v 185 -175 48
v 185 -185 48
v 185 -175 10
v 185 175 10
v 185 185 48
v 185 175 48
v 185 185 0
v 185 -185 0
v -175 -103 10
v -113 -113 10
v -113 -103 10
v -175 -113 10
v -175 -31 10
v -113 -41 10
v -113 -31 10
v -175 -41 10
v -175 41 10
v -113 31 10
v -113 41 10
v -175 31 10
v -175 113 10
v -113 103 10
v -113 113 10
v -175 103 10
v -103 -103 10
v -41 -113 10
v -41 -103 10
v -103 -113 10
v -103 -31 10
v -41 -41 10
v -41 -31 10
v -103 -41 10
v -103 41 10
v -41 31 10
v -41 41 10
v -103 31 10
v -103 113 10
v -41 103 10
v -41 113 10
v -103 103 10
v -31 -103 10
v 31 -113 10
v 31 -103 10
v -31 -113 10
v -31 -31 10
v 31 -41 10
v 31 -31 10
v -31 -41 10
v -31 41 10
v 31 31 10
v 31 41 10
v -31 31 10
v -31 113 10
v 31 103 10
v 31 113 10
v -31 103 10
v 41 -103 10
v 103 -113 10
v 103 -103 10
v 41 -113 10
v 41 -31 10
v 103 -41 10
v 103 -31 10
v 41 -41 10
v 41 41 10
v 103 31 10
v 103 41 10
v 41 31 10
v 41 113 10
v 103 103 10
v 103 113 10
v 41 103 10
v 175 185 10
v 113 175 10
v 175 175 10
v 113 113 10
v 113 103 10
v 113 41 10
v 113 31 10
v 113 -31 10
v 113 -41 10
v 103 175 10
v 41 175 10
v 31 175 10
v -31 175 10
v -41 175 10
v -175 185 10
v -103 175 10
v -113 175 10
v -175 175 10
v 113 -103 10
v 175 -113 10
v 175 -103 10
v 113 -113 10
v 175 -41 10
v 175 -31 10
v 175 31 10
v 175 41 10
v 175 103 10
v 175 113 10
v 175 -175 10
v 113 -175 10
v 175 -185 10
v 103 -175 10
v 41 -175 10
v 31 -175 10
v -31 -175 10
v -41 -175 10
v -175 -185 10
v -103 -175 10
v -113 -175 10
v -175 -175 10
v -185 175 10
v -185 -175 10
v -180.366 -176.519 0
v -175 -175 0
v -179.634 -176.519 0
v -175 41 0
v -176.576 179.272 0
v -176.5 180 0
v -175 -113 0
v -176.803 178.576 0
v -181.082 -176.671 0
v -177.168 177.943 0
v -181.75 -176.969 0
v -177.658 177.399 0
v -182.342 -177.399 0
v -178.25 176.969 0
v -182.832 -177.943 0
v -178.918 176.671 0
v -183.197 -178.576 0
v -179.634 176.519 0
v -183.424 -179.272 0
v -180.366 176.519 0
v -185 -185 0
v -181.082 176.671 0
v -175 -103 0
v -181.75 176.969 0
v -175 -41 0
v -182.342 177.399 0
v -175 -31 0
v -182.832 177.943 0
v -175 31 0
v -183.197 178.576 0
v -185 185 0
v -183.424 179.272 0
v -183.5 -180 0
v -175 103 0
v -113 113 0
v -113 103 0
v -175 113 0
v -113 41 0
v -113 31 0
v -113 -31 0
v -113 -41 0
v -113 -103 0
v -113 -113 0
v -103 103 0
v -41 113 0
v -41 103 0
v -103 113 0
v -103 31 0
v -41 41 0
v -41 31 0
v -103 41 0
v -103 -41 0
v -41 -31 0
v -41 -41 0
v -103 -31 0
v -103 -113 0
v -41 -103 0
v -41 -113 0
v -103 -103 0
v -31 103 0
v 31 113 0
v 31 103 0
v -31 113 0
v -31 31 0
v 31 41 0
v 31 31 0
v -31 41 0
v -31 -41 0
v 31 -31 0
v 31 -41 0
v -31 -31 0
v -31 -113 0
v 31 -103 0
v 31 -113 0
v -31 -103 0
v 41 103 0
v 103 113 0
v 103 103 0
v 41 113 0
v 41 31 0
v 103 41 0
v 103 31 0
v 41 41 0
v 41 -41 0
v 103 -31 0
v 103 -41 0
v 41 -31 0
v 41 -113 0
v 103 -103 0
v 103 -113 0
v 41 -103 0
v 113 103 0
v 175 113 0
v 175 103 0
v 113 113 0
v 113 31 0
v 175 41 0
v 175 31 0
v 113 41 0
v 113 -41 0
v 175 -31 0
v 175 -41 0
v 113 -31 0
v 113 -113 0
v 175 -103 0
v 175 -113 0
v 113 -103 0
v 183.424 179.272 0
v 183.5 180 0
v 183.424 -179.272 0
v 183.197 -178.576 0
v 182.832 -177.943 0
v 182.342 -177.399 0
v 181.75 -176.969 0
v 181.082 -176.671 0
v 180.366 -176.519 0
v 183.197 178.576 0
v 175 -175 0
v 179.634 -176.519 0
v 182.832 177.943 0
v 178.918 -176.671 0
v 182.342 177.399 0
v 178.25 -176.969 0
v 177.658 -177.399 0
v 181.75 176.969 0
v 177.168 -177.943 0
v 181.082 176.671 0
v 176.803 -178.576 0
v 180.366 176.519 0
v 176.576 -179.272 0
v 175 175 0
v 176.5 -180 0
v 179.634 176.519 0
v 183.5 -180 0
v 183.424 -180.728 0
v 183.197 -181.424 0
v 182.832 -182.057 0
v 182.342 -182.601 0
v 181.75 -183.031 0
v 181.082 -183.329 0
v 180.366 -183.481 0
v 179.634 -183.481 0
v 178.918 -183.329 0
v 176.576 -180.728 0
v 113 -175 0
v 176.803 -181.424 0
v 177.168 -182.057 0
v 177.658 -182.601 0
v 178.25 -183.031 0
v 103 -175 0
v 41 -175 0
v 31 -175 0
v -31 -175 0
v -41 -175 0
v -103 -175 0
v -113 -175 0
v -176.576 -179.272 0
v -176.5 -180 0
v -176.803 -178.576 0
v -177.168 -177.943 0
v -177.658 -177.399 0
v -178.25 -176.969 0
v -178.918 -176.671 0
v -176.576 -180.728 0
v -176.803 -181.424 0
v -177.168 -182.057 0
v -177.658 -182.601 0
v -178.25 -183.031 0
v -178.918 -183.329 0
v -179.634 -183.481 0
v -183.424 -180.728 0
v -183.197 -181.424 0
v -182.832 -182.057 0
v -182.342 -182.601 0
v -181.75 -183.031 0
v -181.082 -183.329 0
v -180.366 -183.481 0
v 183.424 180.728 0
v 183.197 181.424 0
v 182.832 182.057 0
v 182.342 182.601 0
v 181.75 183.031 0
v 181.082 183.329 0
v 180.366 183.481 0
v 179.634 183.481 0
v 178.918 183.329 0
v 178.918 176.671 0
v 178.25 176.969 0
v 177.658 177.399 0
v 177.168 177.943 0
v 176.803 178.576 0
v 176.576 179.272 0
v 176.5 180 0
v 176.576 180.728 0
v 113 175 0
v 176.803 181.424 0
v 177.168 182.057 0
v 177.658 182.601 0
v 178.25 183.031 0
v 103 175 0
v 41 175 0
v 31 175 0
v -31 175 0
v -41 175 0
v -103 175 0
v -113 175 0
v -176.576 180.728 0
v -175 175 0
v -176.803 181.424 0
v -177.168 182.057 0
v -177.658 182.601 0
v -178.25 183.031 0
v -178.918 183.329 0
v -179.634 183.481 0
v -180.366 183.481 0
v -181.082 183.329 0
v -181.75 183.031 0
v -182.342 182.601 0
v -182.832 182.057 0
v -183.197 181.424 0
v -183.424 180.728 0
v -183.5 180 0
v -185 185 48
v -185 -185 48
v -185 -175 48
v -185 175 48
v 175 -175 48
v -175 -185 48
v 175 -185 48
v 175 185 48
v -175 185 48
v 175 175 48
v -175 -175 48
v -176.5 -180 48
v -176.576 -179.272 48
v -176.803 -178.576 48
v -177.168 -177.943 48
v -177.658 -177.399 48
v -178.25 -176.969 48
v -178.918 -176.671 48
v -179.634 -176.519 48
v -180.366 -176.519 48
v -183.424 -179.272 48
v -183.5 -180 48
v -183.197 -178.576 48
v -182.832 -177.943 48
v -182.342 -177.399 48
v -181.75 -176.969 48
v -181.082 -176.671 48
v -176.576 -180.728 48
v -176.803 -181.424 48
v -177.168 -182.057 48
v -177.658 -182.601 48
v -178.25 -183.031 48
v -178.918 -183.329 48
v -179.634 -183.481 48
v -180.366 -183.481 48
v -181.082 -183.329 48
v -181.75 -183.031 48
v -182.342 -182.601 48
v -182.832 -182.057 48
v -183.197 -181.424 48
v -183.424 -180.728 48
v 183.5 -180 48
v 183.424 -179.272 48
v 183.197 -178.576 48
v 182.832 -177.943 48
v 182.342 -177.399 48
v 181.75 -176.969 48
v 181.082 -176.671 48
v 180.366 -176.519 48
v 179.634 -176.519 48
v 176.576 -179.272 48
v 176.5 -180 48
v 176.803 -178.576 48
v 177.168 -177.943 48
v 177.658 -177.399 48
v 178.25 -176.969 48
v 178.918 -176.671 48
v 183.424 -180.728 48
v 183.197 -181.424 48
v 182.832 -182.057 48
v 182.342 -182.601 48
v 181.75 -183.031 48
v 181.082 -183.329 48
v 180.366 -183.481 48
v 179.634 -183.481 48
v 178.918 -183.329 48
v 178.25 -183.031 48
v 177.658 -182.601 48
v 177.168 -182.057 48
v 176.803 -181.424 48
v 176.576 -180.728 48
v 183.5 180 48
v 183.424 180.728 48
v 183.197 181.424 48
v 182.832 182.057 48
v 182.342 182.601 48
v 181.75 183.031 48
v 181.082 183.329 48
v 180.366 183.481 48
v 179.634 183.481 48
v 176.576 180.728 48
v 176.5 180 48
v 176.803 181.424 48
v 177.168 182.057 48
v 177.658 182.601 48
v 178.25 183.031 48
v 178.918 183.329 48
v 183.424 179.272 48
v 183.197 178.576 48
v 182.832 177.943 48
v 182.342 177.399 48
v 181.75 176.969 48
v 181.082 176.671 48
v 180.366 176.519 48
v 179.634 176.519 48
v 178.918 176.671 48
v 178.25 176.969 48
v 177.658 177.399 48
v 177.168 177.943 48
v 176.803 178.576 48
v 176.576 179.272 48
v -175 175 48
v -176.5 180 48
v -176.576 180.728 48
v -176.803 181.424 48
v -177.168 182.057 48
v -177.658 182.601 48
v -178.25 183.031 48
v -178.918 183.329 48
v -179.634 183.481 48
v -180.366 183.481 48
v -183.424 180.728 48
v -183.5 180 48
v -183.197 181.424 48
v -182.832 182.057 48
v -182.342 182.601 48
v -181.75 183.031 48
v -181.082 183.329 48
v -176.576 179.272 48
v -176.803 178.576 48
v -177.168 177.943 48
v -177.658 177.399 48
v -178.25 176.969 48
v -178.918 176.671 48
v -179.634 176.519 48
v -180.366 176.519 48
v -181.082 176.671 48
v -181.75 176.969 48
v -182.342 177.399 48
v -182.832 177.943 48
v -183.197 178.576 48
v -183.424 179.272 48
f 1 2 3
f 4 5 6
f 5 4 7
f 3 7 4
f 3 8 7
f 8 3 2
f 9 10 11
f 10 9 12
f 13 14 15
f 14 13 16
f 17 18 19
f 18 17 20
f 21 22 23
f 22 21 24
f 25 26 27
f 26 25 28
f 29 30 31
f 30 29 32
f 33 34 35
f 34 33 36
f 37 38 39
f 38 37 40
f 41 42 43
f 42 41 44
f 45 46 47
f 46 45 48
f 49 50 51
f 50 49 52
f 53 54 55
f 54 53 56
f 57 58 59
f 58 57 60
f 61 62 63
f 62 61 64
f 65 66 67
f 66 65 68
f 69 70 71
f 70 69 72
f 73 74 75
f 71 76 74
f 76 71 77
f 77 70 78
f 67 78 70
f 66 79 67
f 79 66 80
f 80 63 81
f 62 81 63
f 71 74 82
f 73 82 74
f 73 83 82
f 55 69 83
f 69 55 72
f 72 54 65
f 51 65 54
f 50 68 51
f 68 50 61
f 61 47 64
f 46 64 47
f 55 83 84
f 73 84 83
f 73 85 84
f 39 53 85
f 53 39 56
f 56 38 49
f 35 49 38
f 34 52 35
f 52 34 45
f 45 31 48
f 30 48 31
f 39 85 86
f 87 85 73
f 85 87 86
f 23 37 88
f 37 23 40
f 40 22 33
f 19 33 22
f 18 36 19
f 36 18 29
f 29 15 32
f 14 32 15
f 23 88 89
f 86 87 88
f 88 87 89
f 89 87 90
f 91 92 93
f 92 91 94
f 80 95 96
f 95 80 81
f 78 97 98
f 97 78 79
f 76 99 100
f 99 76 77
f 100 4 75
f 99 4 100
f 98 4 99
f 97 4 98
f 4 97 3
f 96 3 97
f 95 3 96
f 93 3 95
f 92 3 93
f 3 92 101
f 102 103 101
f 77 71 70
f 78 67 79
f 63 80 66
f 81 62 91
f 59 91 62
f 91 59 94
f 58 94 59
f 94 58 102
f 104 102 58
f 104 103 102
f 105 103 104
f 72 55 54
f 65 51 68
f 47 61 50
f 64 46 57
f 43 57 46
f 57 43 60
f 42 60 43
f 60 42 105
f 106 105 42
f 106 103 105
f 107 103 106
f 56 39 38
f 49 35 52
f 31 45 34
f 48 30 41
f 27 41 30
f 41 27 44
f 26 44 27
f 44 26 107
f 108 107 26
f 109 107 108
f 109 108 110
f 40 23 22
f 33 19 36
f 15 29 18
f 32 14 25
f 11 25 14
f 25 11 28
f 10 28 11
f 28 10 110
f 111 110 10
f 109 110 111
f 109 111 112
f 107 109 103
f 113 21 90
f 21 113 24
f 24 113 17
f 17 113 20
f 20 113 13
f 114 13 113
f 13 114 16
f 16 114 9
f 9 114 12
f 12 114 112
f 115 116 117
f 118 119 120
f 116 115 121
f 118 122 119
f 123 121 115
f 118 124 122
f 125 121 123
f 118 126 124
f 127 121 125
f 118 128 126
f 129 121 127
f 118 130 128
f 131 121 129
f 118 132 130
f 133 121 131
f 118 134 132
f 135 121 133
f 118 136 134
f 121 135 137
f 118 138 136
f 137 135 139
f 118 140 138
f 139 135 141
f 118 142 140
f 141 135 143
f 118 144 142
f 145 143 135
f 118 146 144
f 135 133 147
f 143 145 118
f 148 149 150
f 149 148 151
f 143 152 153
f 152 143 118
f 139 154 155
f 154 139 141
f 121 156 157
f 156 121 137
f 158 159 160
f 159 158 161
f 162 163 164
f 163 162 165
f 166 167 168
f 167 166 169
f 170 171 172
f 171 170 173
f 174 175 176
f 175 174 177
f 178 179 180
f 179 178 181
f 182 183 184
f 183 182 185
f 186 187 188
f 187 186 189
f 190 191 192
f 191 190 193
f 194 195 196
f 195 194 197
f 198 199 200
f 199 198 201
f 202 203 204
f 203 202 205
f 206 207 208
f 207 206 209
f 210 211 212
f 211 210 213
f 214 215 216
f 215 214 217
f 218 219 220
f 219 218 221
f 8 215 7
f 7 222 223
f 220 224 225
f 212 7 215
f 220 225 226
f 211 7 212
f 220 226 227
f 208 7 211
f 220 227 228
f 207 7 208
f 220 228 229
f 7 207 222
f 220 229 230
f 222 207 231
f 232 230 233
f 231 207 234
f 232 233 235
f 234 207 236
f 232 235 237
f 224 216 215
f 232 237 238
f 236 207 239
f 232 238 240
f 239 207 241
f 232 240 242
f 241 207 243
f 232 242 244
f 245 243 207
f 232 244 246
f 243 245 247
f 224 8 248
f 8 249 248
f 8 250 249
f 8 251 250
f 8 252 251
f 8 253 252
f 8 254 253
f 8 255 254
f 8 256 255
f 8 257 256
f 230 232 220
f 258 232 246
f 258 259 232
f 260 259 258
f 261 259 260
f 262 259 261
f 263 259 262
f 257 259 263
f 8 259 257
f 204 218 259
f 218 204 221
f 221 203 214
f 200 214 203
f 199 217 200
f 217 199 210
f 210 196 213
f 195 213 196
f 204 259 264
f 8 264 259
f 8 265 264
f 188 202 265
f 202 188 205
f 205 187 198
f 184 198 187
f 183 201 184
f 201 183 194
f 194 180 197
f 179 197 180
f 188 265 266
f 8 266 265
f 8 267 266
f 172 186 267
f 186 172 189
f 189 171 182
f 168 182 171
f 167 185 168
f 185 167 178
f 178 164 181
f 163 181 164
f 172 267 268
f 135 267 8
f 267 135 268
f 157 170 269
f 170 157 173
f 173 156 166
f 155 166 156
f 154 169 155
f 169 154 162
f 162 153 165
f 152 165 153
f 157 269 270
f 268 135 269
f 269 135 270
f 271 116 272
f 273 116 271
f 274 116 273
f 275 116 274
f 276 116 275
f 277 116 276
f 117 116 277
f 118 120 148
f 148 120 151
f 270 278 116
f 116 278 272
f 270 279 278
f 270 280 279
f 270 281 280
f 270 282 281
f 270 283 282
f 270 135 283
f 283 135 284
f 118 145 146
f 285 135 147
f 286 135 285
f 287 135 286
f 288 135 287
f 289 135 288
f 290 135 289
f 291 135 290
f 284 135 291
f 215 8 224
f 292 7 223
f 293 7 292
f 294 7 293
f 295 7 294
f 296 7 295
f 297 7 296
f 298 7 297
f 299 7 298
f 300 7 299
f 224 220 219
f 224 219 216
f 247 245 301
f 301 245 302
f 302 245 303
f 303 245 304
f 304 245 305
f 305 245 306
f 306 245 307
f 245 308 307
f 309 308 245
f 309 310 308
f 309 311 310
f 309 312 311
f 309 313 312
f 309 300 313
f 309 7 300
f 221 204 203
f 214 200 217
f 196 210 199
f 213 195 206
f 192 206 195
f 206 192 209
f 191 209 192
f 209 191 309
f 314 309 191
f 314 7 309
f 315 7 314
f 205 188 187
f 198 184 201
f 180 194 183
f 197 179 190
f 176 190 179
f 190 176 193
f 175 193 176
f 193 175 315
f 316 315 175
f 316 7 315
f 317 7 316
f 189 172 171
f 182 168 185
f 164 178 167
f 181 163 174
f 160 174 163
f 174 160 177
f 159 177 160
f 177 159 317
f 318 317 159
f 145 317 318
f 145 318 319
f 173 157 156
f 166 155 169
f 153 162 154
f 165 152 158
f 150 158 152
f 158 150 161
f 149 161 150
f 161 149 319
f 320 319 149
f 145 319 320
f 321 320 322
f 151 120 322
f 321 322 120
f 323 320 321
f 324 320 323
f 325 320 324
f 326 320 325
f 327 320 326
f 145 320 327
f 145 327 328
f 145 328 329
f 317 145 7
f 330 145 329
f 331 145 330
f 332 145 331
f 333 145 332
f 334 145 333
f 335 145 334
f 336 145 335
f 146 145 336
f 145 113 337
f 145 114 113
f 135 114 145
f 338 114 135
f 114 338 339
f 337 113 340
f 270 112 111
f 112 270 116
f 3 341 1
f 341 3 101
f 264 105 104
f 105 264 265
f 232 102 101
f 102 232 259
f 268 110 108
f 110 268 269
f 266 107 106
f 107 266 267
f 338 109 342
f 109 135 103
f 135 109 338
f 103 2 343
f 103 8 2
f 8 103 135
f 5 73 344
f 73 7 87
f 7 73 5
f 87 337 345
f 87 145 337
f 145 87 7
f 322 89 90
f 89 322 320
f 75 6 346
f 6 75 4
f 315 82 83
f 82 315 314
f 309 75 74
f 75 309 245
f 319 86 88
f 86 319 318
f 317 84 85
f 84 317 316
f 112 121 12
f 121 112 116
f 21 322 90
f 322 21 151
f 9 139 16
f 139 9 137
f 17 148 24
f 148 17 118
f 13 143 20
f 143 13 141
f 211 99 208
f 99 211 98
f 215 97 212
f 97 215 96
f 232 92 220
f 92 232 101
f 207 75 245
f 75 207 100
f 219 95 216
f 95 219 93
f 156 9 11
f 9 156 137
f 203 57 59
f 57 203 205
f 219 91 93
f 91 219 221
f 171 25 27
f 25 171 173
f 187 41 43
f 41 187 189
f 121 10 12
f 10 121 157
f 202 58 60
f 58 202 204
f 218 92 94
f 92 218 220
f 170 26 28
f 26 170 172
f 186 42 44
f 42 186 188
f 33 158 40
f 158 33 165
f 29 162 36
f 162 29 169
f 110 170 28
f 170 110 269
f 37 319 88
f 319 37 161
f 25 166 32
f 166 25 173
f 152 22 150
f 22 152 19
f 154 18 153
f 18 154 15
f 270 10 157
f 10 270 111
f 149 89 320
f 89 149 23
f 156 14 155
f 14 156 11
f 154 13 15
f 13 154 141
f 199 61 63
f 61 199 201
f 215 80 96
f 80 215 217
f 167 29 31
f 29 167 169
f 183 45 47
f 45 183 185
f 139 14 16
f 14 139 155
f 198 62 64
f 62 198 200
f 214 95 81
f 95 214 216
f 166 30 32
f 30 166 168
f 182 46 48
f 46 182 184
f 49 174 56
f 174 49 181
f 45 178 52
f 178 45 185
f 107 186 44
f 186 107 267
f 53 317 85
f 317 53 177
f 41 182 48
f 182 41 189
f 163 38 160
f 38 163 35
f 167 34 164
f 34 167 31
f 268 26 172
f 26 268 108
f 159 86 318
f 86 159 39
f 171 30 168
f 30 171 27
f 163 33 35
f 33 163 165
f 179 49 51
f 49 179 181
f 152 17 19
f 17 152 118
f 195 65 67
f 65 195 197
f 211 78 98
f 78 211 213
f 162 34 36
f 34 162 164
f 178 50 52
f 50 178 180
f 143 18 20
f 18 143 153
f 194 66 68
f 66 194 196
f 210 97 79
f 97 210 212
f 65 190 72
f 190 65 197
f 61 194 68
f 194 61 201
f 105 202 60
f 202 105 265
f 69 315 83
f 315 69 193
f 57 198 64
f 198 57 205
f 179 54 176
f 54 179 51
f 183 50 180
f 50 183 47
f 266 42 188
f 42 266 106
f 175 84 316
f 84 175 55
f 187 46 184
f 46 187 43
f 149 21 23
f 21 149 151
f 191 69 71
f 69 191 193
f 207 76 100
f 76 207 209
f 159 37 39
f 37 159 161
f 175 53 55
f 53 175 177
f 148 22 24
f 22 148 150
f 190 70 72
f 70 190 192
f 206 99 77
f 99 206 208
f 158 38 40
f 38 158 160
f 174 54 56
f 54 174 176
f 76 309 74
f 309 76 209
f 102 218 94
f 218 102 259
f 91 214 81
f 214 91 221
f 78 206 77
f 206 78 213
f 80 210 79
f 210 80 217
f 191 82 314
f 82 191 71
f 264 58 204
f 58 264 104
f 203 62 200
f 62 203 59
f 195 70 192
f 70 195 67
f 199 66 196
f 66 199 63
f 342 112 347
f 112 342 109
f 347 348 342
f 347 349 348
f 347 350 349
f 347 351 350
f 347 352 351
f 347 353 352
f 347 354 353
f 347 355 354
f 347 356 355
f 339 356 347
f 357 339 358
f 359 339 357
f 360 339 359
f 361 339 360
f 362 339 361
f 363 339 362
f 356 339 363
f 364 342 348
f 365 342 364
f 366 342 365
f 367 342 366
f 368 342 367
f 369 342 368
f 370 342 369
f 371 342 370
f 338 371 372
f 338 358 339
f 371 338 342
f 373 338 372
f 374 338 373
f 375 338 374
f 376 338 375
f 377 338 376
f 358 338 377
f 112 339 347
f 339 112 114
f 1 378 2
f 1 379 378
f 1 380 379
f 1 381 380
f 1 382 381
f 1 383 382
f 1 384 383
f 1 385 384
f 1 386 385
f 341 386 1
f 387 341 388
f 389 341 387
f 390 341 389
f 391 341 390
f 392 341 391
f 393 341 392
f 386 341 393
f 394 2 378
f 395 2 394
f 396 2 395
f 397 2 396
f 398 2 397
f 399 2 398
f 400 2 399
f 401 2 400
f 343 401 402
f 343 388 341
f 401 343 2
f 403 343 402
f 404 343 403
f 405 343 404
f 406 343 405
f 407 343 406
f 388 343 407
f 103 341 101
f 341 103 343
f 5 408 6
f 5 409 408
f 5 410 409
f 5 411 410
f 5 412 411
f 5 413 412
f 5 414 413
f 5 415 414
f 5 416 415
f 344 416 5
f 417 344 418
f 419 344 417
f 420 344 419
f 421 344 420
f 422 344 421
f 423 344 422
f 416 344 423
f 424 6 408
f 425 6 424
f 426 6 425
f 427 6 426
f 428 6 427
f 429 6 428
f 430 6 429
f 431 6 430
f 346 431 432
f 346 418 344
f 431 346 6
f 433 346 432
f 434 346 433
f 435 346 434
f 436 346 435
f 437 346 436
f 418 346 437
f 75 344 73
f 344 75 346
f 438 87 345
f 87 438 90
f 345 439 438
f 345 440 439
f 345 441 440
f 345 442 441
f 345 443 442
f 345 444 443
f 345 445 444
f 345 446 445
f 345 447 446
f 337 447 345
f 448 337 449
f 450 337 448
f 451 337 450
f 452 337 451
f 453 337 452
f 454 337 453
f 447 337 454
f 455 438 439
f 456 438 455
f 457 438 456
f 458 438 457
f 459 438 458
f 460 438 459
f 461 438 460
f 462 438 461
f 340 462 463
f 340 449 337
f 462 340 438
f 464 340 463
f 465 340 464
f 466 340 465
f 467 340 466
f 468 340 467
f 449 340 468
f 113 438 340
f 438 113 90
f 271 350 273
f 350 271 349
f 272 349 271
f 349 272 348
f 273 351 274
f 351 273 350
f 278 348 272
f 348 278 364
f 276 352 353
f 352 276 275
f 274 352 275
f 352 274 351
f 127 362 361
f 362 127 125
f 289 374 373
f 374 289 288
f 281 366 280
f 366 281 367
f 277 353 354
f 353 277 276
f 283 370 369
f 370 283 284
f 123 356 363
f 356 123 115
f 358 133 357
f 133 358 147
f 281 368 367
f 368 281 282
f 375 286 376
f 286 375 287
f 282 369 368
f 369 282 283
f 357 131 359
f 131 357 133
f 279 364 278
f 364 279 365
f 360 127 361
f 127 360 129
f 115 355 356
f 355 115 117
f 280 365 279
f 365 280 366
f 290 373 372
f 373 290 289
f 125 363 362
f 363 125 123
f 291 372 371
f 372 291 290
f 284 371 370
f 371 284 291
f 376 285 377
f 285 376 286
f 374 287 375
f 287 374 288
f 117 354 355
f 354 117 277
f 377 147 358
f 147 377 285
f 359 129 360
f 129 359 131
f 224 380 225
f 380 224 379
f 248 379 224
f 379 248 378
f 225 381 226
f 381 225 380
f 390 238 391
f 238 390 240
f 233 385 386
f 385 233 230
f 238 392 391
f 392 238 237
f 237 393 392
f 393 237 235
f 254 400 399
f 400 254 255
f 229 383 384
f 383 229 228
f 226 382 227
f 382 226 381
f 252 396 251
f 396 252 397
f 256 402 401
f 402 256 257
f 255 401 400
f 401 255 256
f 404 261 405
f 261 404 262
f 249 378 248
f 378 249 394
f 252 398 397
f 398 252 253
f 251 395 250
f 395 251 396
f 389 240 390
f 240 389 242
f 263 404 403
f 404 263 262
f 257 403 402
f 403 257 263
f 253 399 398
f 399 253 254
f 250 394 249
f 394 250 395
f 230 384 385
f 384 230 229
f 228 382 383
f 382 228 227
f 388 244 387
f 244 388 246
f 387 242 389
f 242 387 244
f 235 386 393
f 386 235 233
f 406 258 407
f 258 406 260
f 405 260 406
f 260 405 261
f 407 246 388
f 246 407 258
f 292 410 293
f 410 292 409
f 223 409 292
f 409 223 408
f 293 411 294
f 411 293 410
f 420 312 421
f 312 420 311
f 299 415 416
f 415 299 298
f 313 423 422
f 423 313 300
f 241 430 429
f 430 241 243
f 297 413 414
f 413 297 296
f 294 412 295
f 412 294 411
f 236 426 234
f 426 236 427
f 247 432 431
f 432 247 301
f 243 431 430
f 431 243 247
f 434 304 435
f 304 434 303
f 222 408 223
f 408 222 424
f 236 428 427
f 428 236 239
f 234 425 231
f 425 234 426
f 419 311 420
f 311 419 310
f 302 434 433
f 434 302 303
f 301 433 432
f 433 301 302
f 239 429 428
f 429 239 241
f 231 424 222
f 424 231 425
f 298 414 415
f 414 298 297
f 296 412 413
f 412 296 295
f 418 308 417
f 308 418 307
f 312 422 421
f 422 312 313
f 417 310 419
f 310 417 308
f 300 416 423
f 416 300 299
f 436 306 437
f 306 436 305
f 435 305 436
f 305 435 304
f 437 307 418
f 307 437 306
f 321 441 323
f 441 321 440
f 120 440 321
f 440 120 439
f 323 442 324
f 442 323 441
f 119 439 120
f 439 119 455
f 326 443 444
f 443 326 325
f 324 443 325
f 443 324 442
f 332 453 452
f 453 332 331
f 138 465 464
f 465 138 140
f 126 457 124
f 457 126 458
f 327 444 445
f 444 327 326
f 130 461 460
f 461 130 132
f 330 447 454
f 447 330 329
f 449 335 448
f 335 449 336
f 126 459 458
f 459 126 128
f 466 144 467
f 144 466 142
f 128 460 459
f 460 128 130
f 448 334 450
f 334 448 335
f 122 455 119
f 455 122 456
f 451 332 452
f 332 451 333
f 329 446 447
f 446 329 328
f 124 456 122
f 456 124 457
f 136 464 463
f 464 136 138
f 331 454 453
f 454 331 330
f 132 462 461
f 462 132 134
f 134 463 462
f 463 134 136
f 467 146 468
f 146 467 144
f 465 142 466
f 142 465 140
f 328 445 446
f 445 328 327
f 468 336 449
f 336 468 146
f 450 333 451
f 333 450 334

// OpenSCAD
difference()
{
  union()
  {
    // Perimeter bars
    translate([-185, -185, 0]) cube([370, 10, 10]);
    translate([-185, 175, 0]) cube([370, 10, 10]);
    translate([-185, -185, 0]) cube([10, 370, 10]);
    translate([175, -185, 0]) cube([10, 370, 10]); // Intermediate grid bars
    translate([-185, -113, 0]) cube([370, 10, 10]);
    translate([-113, -185, 0]) cube([10, 370, 10]);
    translate([-185, -41, 0]) cube([370, 10, 10]);
    translate([-41, -185, 0]) cube([10, 370, 10]);
    translate([-185, 31, 0]) cube([370, 10, 10]);
    translate([31, -185, 0]) cube([10, 370, 10]);
    translate([-185, 103, 0]) cube([370, 10, 10]);
    translate([103, -185, 0]) cube([10, 370, 10]); // Vertical corner bars
    translate([-185, -185, 0]) cube([10, 10, 48]);
    translate([175, -185, 0]) cube([10, 10, 48]);
    translate([175, 175, 0]) cube([10, 10, 48]);
    translate([-185, 175, 0]) cube([10, 10, 48]);
  }
  // Holes for M6 rods
  translate([-180, -180, -1]) cylinder(d = 7, h = 50, $fn = 30);
  translate([180, -180, -1]) cylinder(d = 7, h = 50, $fn = 30);
  translate([180, 180, -1]) cylinder(d = 7, h = 50, $fn = 30);
  translate([-180, 180, -1]) cylinder(d = 7, h = 50, $fn = 30);
}
